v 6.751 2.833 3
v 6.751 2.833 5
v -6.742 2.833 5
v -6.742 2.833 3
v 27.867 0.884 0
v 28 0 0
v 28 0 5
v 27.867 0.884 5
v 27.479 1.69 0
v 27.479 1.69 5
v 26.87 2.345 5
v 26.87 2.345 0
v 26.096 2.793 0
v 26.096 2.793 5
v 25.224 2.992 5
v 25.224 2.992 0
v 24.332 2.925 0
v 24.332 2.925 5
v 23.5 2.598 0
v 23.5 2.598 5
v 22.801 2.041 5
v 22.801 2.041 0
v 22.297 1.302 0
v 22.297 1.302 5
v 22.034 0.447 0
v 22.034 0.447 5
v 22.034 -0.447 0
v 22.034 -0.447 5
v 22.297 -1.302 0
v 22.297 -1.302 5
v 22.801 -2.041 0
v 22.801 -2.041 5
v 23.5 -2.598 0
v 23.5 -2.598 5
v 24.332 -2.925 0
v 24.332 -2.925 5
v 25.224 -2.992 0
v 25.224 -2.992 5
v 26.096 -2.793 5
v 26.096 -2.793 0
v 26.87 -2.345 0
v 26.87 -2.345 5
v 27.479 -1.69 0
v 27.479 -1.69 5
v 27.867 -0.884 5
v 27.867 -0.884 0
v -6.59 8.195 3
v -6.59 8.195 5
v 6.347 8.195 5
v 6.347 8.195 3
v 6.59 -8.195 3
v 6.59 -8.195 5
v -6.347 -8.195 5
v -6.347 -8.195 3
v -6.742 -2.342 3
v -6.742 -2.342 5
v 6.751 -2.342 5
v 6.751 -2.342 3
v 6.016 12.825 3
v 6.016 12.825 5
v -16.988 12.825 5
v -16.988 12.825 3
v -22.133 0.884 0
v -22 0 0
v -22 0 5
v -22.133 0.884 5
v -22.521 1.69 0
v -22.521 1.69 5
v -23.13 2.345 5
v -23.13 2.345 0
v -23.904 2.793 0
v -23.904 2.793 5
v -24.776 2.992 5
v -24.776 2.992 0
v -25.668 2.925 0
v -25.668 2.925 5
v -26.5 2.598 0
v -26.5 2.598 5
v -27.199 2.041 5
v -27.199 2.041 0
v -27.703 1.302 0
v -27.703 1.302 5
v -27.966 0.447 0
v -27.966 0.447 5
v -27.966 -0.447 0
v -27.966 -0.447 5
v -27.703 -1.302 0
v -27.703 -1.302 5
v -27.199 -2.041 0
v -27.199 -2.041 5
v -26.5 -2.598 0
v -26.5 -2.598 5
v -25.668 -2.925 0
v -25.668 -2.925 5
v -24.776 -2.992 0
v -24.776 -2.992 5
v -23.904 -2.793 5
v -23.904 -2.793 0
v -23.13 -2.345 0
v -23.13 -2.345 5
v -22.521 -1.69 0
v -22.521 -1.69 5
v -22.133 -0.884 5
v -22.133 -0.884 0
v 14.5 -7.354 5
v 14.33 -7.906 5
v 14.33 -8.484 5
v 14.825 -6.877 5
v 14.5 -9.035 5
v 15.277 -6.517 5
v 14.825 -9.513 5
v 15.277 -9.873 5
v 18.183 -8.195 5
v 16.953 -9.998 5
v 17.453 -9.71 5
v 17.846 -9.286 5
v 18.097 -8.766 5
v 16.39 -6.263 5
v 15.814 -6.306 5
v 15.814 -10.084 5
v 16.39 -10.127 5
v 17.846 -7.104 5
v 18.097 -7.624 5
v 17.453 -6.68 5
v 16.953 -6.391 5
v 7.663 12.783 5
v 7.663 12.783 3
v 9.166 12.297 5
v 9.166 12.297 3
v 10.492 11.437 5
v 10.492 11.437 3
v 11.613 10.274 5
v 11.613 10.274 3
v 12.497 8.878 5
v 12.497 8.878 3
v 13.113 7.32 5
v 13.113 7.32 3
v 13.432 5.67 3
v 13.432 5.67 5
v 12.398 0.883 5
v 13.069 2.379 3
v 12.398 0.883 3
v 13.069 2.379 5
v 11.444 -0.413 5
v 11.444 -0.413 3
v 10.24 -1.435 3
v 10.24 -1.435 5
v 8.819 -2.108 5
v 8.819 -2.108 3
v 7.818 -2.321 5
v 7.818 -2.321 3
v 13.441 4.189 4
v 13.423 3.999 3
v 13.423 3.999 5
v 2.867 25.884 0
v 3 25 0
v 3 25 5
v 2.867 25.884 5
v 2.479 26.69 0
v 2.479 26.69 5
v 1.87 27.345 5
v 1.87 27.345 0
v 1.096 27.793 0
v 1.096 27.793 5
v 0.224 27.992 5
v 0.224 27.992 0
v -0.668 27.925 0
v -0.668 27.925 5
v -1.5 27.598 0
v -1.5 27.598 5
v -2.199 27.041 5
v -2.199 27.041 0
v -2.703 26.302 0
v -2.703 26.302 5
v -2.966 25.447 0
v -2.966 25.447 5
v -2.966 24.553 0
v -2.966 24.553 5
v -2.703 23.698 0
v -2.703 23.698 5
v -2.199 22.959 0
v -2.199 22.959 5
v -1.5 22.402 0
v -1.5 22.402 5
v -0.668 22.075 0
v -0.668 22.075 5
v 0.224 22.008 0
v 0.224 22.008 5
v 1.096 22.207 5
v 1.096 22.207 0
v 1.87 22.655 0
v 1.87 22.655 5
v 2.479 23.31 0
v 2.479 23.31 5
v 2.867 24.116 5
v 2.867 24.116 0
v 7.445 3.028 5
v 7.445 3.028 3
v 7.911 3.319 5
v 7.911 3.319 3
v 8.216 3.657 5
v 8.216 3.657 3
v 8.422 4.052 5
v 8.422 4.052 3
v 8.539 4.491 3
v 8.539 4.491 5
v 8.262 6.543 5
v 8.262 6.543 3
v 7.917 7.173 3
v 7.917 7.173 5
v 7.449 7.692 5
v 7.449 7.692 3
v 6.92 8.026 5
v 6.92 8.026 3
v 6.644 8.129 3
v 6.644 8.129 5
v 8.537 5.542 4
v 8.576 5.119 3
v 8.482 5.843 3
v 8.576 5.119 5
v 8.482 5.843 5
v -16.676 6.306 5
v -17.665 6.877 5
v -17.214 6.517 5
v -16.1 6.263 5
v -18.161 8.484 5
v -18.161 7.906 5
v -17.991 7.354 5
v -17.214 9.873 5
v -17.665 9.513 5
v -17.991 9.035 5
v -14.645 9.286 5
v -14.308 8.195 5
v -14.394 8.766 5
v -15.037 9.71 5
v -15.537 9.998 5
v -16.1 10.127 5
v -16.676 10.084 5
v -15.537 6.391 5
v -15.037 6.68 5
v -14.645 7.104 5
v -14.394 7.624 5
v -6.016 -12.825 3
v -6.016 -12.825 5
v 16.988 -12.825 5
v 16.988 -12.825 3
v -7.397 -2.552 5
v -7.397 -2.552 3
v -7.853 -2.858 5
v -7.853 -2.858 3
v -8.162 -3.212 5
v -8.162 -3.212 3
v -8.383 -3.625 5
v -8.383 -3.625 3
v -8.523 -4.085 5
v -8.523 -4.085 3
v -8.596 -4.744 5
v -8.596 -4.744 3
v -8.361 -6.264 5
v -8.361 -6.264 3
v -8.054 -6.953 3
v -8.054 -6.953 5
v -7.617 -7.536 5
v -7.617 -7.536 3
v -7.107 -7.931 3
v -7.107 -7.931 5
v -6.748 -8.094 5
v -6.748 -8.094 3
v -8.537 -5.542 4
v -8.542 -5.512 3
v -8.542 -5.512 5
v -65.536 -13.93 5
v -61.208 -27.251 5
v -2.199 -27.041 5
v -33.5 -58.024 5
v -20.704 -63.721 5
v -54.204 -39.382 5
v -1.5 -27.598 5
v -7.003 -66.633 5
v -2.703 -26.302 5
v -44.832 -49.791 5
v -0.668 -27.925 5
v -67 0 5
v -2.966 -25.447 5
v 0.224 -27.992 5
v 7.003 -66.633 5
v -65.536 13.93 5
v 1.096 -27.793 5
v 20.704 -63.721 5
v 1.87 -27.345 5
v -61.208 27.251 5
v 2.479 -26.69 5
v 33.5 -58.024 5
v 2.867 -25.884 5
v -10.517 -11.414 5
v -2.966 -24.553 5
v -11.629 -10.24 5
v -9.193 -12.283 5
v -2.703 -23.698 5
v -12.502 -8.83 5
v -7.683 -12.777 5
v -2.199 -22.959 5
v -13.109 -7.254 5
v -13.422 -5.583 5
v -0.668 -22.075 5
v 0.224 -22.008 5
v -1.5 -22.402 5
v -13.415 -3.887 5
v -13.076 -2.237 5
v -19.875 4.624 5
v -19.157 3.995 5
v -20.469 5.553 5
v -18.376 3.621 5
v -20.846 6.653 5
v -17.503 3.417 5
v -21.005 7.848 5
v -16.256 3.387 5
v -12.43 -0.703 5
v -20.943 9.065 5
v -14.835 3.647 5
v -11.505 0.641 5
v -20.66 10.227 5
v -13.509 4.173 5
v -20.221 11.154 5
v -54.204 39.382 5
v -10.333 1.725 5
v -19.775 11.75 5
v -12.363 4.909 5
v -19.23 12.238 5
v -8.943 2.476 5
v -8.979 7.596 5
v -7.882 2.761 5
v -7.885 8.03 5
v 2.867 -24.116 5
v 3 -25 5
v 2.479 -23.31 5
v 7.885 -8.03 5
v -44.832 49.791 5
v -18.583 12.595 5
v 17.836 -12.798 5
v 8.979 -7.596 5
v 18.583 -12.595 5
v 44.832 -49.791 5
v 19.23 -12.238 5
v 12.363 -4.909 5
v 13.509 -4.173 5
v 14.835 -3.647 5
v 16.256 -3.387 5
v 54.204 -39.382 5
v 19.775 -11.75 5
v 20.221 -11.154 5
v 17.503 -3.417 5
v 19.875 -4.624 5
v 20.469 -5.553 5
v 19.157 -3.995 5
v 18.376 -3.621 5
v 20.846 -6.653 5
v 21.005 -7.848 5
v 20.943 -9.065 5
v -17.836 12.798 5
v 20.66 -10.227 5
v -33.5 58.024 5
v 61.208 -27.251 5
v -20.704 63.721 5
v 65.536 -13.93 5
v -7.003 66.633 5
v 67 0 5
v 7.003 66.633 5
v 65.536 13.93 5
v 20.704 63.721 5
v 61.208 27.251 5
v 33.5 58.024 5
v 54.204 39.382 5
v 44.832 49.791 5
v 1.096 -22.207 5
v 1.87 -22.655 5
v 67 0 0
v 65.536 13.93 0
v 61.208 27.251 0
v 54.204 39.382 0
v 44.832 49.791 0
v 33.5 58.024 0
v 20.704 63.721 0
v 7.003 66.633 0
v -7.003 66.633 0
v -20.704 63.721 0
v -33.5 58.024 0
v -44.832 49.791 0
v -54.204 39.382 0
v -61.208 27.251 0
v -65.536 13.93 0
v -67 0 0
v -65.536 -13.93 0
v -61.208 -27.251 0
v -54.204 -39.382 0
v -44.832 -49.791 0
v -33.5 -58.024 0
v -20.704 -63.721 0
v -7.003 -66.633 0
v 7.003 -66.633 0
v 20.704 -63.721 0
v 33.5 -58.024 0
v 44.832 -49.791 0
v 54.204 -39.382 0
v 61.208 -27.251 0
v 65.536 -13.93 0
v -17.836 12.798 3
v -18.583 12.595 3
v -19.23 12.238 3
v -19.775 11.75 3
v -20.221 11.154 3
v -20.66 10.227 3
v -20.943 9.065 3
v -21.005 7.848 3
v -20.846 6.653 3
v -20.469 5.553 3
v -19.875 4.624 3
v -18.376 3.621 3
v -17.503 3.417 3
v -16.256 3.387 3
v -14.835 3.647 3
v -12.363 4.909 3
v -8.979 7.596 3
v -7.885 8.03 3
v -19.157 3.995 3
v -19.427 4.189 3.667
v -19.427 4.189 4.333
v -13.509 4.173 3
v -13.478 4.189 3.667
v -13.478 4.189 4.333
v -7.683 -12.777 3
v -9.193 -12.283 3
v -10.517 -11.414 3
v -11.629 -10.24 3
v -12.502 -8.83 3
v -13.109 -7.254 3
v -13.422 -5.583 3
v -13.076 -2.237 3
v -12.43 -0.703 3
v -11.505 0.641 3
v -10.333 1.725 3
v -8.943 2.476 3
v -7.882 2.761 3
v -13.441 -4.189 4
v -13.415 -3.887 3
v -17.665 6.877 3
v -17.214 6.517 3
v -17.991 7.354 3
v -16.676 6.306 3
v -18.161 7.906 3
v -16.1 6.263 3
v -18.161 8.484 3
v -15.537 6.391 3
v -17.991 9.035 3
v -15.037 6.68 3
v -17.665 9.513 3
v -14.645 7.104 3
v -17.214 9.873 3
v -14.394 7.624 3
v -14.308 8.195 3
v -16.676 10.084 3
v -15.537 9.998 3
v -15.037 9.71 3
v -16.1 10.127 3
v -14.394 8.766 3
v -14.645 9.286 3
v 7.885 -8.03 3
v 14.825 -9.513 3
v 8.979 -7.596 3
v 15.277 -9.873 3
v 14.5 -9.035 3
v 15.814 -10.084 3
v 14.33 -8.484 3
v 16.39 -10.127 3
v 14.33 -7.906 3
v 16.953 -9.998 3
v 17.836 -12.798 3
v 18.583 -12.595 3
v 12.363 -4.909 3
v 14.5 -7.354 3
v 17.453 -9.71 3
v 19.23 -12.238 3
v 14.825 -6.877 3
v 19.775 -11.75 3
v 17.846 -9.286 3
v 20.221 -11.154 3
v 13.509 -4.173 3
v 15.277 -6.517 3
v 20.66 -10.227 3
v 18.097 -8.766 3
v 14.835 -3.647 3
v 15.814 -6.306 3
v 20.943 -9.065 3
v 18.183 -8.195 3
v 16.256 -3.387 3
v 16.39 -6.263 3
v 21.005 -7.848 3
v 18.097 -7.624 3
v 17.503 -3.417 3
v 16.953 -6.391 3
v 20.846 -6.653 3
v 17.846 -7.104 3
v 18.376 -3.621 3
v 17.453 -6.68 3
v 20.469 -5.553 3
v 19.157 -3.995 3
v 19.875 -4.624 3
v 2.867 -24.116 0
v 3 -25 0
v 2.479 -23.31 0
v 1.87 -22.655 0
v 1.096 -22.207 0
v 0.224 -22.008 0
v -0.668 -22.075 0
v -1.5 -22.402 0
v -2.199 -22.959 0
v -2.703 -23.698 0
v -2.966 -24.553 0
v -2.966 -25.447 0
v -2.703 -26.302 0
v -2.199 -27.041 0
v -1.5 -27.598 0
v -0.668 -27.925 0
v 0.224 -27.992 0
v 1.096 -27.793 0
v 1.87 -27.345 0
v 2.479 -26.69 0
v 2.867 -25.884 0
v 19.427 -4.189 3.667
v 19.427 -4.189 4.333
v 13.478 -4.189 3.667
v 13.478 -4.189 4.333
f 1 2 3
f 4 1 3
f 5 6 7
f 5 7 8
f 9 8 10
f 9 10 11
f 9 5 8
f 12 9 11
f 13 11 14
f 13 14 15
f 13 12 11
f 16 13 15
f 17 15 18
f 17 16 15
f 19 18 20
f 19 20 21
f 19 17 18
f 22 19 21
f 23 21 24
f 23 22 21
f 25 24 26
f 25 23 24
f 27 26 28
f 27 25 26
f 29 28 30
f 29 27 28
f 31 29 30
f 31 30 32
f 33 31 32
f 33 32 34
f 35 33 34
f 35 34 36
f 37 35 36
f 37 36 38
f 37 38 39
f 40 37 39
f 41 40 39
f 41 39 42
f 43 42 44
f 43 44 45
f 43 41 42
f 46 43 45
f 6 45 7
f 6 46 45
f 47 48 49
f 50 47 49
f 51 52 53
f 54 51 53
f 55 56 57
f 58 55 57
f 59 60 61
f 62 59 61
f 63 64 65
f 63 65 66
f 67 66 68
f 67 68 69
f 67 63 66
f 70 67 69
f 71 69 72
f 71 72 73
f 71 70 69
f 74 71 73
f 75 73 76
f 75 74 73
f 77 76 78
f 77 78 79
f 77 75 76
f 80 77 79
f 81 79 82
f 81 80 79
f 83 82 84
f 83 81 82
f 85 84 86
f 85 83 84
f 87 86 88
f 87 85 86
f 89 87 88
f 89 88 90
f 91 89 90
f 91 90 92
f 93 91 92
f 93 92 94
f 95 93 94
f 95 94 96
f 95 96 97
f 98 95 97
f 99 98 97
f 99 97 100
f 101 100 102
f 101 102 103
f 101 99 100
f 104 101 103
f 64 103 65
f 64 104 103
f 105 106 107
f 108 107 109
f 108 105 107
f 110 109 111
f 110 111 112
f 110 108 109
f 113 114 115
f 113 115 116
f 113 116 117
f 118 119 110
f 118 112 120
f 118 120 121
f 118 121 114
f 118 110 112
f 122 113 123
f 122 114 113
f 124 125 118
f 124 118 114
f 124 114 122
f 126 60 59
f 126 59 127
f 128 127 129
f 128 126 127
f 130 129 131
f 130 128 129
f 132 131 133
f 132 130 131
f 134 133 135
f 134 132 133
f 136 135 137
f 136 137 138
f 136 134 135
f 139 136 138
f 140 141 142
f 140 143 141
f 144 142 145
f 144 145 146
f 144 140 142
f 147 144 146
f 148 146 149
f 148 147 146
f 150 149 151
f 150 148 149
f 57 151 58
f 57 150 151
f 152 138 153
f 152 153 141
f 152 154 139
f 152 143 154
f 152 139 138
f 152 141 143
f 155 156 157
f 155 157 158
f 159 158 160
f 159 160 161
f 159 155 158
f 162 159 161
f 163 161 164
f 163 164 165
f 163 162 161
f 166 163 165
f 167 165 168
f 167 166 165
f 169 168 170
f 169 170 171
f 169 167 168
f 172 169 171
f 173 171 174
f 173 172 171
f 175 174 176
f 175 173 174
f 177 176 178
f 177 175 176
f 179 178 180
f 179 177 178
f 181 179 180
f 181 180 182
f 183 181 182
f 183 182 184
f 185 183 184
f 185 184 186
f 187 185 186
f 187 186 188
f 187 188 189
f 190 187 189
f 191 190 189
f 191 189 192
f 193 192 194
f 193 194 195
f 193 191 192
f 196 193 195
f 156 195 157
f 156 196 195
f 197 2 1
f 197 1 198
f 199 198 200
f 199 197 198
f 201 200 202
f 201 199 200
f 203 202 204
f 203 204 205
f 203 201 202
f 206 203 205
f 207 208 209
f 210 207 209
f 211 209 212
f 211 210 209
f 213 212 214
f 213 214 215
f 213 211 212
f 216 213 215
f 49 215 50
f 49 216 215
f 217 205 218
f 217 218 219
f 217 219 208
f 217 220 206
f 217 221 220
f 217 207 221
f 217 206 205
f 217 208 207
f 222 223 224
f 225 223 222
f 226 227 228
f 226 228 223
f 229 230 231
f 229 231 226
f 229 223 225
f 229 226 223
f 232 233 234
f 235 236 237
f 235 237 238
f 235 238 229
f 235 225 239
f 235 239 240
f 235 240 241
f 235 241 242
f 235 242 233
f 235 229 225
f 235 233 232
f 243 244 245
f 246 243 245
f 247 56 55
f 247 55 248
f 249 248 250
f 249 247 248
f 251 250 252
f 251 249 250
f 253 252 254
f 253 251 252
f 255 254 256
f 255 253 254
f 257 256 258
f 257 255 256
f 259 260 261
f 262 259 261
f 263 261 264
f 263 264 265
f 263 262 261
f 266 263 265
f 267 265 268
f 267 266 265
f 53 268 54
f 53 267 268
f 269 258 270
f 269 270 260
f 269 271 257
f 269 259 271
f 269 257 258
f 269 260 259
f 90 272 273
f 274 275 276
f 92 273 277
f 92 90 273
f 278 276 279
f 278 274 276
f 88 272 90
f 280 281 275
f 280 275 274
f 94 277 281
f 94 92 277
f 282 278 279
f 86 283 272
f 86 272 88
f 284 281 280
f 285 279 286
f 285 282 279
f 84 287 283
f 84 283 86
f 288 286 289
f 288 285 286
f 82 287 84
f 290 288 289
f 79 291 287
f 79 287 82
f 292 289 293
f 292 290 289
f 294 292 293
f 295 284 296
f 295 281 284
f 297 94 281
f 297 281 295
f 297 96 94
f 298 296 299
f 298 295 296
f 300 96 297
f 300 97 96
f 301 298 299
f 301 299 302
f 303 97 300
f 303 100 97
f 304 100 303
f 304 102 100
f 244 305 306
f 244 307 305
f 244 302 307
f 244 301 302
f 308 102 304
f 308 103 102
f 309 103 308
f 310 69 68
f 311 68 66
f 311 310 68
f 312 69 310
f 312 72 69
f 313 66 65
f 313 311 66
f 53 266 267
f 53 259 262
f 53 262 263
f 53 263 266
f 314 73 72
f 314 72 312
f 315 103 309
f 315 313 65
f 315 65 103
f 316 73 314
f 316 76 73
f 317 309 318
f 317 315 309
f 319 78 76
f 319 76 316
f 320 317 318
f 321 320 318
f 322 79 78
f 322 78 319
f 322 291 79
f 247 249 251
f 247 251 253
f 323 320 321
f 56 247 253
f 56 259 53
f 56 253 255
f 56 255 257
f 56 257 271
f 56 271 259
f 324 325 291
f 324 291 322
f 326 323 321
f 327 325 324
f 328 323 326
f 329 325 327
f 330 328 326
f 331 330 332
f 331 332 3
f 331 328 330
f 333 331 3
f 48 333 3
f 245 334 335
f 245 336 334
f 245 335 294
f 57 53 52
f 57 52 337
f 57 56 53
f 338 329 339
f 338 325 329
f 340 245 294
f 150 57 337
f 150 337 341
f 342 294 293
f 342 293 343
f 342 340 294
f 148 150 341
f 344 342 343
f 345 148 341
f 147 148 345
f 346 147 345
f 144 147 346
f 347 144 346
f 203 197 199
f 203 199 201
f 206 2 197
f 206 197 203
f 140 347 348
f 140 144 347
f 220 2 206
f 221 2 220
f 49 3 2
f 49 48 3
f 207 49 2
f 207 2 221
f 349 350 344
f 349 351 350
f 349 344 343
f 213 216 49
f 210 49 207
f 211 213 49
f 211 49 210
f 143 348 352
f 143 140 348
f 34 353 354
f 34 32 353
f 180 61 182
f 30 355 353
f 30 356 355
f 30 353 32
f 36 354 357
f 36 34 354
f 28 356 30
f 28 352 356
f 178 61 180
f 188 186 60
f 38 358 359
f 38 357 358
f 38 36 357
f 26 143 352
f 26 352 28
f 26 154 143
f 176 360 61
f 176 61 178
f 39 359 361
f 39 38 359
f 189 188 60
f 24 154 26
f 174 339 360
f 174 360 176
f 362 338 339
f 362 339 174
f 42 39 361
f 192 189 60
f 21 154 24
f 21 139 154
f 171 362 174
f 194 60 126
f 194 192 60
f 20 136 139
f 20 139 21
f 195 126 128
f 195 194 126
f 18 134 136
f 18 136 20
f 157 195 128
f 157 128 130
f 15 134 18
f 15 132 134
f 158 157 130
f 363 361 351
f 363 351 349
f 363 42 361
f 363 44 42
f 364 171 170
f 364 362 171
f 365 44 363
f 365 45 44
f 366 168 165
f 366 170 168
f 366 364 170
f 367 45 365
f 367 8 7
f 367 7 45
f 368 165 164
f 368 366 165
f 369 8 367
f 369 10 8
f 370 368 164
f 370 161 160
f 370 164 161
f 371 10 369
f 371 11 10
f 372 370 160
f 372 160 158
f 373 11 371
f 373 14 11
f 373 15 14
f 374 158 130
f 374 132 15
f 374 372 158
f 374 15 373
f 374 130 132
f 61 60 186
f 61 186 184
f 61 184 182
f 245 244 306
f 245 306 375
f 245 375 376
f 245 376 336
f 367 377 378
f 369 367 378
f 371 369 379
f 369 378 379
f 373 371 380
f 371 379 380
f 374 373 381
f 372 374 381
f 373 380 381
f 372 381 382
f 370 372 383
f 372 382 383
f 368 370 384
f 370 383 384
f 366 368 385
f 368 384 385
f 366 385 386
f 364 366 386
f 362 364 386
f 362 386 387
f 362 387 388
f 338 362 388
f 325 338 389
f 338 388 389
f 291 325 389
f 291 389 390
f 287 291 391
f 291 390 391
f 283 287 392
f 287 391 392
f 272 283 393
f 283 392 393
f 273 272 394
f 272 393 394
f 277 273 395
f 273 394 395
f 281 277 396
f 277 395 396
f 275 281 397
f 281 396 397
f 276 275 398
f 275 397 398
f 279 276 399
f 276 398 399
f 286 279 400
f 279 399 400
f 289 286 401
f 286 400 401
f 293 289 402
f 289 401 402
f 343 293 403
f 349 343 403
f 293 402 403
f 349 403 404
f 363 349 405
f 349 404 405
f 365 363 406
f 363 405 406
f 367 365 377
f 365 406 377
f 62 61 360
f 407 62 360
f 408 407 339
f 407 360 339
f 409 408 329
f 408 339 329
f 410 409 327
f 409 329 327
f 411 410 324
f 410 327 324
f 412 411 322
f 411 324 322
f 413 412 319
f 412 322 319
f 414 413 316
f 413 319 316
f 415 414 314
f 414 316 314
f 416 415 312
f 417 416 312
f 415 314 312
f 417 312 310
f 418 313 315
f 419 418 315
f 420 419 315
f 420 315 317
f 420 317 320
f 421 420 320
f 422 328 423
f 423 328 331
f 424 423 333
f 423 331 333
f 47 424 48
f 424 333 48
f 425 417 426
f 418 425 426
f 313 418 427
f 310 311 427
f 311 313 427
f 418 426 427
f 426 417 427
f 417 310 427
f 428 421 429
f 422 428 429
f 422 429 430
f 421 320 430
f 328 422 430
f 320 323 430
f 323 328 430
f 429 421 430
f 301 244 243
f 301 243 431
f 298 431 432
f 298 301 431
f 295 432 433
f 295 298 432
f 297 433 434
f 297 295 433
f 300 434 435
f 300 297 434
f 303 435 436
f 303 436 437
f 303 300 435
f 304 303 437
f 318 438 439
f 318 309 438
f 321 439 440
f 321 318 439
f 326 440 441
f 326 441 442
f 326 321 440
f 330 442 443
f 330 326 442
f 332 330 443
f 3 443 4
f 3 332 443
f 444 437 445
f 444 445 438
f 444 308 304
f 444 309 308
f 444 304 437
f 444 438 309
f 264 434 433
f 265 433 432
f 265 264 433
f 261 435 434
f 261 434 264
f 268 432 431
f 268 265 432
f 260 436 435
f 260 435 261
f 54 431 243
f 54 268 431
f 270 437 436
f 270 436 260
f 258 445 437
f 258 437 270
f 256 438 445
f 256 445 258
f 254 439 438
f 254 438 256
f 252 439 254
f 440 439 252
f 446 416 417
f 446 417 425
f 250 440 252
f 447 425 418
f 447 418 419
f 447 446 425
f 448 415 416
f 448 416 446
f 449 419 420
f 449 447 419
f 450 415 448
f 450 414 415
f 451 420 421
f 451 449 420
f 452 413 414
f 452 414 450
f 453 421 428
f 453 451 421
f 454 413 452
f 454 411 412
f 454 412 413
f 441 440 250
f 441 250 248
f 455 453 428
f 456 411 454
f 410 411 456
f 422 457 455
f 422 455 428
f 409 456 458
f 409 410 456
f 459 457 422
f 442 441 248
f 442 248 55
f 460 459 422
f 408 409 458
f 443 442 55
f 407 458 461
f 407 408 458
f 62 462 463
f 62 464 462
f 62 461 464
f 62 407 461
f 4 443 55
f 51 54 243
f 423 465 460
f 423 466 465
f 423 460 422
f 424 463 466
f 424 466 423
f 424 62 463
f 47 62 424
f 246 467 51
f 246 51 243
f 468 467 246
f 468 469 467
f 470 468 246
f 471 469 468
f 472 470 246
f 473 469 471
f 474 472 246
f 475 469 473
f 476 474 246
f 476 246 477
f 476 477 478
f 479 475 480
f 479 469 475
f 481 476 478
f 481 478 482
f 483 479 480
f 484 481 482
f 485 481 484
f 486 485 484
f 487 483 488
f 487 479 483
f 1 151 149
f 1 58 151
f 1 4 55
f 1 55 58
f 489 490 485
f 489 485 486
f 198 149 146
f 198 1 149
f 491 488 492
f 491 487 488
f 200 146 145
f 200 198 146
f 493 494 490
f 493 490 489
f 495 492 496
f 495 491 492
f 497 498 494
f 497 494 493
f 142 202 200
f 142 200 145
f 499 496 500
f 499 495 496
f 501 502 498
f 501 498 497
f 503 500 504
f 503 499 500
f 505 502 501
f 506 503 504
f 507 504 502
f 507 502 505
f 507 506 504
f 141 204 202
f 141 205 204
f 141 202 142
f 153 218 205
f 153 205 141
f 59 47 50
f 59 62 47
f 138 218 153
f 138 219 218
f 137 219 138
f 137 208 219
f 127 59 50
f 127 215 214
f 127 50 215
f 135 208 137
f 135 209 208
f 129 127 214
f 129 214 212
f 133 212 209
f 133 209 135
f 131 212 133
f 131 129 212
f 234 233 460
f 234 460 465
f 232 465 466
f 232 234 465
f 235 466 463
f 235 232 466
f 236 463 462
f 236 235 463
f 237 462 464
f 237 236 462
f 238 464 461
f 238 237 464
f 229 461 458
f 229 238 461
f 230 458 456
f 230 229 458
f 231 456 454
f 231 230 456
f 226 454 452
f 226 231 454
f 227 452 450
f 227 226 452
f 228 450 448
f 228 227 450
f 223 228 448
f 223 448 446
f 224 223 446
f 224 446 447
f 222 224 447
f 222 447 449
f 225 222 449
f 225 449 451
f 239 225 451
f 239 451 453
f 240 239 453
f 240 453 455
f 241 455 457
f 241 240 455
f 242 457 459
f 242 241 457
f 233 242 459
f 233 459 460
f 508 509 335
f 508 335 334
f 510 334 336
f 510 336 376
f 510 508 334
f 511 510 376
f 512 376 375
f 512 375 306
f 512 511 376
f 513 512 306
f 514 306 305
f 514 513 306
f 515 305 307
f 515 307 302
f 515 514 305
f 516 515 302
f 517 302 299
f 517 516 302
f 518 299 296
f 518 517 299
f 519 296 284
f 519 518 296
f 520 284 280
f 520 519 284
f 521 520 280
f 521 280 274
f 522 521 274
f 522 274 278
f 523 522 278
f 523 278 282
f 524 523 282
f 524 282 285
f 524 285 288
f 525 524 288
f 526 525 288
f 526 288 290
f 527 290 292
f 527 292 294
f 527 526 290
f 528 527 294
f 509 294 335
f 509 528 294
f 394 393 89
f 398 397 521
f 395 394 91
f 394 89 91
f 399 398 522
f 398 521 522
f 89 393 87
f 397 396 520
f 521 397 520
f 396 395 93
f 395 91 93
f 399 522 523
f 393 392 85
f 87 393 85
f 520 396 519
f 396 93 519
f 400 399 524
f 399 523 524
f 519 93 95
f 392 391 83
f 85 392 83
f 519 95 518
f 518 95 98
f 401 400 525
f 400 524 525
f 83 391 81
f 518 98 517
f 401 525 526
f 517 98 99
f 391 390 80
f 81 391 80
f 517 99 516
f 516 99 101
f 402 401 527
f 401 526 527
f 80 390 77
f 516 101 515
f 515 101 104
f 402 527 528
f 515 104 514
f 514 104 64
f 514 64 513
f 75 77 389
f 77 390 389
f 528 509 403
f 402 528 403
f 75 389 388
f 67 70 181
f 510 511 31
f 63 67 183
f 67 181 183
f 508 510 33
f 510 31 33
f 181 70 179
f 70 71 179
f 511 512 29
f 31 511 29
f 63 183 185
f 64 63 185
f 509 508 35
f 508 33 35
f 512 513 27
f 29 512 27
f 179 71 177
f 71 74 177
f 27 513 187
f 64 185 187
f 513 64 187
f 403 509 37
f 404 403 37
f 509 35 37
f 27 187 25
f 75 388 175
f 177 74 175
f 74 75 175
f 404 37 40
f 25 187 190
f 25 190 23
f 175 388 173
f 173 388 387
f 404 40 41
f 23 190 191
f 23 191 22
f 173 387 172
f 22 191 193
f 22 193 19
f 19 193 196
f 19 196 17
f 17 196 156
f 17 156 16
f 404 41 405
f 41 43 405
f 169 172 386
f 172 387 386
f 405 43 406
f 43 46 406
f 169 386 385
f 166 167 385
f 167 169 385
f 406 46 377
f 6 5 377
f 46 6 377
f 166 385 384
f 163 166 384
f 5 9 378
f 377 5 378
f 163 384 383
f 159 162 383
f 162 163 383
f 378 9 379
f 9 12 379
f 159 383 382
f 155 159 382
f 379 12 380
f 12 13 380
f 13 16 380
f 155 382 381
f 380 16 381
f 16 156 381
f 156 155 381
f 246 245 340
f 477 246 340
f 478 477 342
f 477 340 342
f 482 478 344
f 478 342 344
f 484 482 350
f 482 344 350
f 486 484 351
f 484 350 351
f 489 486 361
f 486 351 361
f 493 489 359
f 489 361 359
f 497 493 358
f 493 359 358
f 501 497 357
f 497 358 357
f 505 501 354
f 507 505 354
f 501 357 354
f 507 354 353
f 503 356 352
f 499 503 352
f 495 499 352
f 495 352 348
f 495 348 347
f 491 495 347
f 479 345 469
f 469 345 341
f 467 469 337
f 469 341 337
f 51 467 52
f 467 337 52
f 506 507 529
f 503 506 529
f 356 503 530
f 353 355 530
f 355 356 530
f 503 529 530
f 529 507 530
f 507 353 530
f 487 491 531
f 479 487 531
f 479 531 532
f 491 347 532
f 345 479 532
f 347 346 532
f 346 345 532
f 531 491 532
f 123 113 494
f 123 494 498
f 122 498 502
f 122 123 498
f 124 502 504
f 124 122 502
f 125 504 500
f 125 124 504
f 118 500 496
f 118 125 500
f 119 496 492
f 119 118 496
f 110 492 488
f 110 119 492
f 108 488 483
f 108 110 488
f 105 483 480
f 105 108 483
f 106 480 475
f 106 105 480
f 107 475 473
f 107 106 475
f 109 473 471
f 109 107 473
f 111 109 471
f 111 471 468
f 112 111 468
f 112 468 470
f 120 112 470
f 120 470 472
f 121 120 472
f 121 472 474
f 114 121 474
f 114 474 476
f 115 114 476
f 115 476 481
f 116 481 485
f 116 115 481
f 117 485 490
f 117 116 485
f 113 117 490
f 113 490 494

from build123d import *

# Parameters (mm, degrees)
SZKIC1_R                    = 67
SZKIC1_R_2                  = 3
DODANIE_WYCI_GNI_CIE1_DEPTH = 5
SZKIC2_R                    = 1.937371164
WYTNIJ_WYCI_GNI_CIE1_DEPTH  = 2


with BuildPart() as part:
    # Szkic1 → Dodanie-wyciągnięcie1 (new body)
    with BuildSketch(Plane.XY):
        Circle(SZKIC1_R)
        with Locations((0, 25)):
            Circle(SZKIC1_R_2, mode=Mode.SUBTRACT)
        with Locations((25, 0)):
            Circle(SZKIC1_R_2, mode=Mode.SUBTRACT)
        with Locations((0, -25)):
            Circle(SZKIC1_R_2, mode=Mode.SUBTRACT)
        with Locations((-25, 0)):
            Circle(SZKIC1_R_2, mode=Mode.SUBTRACT)
    extrude(amount=DODANIE_WYCI_GNI_CIE1_DEPTH)

    # Szkic2 → Wytnij-wyciągnięcie1 (cut)
    with BuildSketch(Plane.XY.offset(5)):
        with BuildLine():
            Line((6.015596419, 12.825090242), (-16.98777971, 12.825090242))
            add(Edge.make_bspline(
                [(-16.98777971, 12.825090242), (-21.398431669, 13.157388334), (-22.546113217, 2.558365481), (-11.828245601, 3.533872092), (-9.796666854, 8.186074774), (-6.590160082, 8.194882462)],
                knots=[0, 0, 0, 0, 0.432020753, 0.673133157, 1, 1, 1, 1], degree=3))
            Line((-6.590160082, 8.194882462), (6.347109239, 8.194882462))
            add(Edge.make_bspline(
                [(6.750985333, 2.833348247), (8.366457692, 3.074986228), (9.070388327, 5.597763216), (7.624972799, 7.999760841), (6.347109239, 8.194882462)],
                knots=[0, 0, 0, 0, 0.494793037, 1, 1, 1, 1], degree=3))
            Line((6.750985333, 2.833348247), (-6.742018824, 2.833348247))
            add(Edge.make_bspline(
                [(-6.015596419, -12.825090242), (-10.545778612, -13.3417132), (-16.414760064, -4.631679813), (-10.491978135, 2.966309296), (-6.742018824, 2.833348247)],
                knots=[0, 0, 0, 0, 0.544342745, 1, 1, 1, 1], degree=3))
            Line((-6.015596419, -12.825090242), (16.98777971, -12.825090242))
            add(Edge.make_bspline(
                [(16.98777971, -12.825090242), (21.398431669, -13.157388334), (22.546113217, -2.558365481), (11.828245601, -3.533872092), (9.796666854, -8.186074774), (6.590160082, -8.194882462)],
                knots=[0, 0, 0, 0, 0.432020753, 0.673133157, 1, 1, 1, 1], degree=3))
            Line((6.590160082, -8.194882462), (-6.347109239, -8.194882462))
            add(Edge.make_bspline(
                [(-6.742018824, -2.341525215), (-8.383912674, -2.639536282), (-9.106573397, -5.485782084), (-7.635691285, -7.991138773), (-6.347109239, -8.194882462)],
                knots=[0, 0, 0, 0, 0.526459521, 1, 1, 1, 1], degree=3))
            Line((-6.742018824, -2.341525215), (6.750985333, -2.341525215))
            add(Edge.make_bspline(
                [(6.015596419, 12.825090242), (10.510890039, 13.359942568), (16.495321184, 4.672671746), (10.416213029, -2.612973757), (6.750985333, -2.341525215)],
                knots=[0, 0, 0, 0, 0.552476507, 1, 1, 1, 1], degree=3))
        make_face()
        with Locations((-16.245257119, 8.194882462)):
            Circle(SZKIC2_R, mode=Mode.SUBTRACT)
        with Locations((16.245257119, -8.194882462)):
            Circle(SZKIC2_R, mode=Mode.SUBTRACT)
    extrude(amount=-WYTNIJ_WYCI_GNI_CIE1_DEPTH, mode=Mode.SUBTRACT)


solid = part.part
